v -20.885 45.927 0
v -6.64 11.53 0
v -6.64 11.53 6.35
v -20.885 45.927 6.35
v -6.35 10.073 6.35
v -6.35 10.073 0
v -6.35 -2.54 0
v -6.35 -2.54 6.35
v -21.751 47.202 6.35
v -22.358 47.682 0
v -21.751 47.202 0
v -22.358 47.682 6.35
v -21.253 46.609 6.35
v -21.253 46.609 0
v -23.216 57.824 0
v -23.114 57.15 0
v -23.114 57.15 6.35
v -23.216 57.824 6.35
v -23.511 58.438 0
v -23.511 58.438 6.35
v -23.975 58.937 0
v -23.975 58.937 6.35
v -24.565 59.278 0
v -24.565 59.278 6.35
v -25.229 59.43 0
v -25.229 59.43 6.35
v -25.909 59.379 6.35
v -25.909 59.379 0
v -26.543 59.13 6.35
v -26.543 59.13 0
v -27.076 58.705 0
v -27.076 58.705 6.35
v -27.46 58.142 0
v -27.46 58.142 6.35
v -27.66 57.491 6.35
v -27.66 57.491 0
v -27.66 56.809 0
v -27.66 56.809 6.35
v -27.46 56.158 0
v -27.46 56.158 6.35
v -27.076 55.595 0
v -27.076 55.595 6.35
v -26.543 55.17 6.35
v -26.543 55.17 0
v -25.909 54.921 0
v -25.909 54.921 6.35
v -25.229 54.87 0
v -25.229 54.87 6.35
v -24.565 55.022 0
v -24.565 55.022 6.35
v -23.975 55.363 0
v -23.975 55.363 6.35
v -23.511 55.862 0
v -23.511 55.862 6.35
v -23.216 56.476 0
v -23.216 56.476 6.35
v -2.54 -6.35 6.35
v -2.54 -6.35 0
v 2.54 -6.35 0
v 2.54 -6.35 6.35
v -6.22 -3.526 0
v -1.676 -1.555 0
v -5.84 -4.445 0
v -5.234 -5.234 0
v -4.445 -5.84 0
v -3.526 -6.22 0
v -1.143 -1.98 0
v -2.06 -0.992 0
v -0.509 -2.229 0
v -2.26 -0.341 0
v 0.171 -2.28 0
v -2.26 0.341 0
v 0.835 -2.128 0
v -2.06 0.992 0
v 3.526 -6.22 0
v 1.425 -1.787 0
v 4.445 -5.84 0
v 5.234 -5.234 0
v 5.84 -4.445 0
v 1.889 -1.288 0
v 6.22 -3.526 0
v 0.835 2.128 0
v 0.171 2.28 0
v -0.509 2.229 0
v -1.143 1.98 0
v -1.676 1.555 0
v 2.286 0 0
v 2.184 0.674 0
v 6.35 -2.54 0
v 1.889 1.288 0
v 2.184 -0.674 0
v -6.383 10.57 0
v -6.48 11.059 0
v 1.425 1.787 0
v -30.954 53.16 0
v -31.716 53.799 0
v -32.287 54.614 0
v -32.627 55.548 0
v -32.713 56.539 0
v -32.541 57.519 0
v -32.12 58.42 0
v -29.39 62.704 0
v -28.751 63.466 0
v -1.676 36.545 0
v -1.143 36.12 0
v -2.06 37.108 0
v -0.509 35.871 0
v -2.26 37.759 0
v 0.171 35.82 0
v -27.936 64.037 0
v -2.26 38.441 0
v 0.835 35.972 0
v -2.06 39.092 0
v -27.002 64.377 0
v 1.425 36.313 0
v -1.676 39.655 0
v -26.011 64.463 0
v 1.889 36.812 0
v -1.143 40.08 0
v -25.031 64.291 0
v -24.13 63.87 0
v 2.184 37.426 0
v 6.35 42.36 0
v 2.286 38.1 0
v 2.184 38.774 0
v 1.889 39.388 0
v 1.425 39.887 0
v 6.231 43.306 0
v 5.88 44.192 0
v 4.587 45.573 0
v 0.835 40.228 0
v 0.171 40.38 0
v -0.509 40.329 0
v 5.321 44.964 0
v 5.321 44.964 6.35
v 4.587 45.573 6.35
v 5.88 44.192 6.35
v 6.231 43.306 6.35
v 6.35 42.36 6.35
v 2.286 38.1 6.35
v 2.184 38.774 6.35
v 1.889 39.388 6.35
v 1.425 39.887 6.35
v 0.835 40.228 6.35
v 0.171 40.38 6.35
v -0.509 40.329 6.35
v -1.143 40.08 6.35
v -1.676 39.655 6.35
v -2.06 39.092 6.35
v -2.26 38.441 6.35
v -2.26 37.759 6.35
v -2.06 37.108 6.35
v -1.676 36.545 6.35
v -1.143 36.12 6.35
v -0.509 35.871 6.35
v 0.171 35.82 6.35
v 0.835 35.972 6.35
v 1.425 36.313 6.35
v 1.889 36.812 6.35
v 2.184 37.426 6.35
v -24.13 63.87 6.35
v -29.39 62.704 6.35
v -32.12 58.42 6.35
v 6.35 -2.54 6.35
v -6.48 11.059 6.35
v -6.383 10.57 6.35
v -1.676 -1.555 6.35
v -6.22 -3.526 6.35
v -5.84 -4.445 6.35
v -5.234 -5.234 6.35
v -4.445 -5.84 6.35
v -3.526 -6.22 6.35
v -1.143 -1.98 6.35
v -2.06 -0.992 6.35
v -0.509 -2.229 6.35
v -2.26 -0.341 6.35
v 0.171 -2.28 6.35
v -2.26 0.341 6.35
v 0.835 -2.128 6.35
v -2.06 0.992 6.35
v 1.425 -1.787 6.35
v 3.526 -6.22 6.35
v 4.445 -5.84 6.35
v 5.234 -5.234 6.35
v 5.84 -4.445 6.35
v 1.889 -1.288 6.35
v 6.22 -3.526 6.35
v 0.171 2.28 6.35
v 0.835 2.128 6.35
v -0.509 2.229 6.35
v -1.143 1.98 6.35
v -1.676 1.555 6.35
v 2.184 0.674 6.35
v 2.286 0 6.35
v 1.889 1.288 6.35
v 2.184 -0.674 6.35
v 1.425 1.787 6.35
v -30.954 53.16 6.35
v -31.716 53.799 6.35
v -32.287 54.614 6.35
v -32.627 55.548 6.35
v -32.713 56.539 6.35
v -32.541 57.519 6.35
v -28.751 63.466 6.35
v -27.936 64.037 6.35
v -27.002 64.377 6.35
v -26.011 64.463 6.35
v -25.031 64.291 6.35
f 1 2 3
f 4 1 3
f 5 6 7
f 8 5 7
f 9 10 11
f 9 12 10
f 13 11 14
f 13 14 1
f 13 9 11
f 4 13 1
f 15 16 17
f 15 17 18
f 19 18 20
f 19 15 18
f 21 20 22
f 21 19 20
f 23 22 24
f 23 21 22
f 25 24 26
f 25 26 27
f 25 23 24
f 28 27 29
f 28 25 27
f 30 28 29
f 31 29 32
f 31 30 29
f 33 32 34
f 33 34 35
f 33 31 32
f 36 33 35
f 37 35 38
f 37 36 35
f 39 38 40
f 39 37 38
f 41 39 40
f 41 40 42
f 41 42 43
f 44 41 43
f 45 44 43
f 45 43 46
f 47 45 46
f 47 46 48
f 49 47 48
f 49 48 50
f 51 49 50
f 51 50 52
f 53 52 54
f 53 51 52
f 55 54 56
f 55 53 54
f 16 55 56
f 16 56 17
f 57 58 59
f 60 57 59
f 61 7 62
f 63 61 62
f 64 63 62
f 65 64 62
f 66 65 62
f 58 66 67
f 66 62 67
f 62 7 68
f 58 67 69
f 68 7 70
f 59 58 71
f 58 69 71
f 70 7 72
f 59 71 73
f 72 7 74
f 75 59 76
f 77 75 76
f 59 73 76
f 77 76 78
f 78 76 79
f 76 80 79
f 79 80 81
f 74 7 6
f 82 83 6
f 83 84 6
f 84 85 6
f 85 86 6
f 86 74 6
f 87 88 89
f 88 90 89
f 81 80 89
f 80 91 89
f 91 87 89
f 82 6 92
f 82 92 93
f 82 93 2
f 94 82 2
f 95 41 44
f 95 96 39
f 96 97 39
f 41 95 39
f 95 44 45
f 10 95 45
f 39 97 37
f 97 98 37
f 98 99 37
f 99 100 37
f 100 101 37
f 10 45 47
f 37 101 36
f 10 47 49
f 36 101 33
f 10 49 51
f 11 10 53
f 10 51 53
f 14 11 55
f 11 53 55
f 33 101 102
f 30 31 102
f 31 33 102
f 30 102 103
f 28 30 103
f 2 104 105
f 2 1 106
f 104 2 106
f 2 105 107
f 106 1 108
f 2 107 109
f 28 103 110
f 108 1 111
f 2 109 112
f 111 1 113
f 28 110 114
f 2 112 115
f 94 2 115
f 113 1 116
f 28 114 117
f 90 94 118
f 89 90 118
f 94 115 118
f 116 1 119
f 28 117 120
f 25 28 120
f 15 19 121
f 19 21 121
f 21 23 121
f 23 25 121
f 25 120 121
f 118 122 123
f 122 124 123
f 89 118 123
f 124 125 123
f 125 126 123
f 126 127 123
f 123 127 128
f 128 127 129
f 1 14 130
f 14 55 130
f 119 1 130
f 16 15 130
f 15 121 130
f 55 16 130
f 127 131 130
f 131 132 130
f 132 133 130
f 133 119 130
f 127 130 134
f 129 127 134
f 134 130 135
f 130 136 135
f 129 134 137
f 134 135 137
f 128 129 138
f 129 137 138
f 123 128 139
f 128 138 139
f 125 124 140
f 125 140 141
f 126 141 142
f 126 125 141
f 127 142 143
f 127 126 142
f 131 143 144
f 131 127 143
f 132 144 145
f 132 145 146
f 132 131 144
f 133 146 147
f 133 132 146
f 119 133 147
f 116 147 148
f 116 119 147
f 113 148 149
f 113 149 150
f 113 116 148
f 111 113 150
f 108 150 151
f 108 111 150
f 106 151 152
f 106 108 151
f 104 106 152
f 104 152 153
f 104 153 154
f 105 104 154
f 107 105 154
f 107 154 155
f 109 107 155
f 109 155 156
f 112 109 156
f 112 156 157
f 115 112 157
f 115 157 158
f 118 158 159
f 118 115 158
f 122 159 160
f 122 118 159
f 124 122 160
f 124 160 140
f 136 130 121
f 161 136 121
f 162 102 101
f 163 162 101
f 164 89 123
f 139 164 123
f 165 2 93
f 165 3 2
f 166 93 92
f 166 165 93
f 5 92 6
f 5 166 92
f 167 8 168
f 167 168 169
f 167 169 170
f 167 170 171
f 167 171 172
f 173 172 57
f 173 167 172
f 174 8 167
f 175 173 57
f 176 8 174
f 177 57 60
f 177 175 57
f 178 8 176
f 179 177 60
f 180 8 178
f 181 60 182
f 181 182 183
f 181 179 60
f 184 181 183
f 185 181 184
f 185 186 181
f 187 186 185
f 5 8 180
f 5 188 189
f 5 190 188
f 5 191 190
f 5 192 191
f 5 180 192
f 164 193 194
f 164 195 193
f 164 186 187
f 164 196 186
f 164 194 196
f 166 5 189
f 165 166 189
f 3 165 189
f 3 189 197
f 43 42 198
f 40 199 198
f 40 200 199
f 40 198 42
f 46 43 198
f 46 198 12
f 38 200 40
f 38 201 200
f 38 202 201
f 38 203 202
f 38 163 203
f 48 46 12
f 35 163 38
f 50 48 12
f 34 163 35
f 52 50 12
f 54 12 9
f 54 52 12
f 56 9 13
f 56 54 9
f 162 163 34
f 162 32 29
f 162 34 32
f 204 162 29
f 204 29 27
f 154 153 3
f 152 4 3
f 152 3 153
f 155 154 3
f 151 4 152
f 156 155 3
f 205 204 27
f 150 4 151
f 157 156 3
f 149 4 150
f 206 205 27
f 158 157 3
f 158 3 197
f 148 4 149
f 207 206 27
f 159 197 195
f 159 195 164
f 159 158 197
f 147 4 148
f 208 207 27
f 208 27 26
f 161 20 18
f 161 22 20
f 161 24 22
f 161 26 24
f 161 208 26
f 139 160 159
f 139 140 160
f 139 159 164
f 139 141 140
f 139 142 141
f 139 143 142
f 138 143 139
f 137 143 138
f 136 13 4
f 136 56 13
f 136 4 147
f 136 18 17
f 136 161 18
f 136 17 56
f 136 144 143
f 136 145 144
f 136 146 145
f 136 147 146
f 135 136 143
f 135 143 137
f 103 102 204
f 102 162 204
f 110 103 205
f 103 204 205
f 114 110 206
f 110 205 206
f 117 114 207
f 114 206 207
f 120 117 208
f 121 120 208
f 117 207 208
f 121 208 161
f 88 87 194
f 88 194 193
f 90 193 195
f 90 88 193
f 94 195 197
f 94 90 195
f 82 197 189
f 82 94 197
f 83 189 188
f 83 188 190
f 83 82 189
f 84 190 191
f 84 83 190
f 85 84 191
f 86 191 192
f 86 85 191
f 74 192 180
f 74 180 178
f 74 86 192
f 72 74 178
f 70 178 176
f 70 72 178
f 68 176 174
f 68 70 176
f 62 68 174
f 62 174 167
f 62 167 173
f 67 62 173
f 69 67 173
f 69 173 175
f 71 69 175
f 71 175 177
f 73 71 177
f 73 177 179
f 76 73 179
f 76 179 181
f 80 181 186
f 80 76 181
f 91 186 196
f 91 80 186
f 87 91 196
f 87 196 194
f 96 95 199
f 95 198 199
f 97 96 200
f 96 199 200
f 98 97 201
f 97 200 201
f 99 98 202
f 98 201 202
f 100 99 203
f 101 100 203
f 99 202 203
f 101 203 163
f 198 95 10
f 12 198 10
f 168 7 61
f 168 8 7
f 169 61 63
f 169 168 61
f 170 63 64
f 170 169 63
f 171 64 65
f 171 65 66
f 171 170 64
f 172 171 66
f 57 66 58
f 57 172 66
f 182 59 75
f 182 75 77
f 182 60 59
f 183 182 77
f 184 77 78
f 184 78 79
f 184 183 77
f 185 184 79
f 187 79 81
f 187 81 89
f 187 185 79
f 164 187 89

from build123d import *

# Parameters (mm, degrees)
SKETCH1_R           = 2.286
BOSS_EXTRUDE1_DEPTH = 6.35
CHAMFER1_SIZE       = 17.78
CHAMFER1_SIZE2      = 26.652616032
FILLET1_R           = 3.81


with BuildPart() as part:
    # Sketch1 → Boss-Extrude1 (new body)
    with BuildSketch(Plane.XY):
        Polygon((-34.167492812, 55.206788795), (-6.35, 37.482986116), (-6.35, -6.35), (6.35, -6.35), (6.35, 44.45), (-27.343211205, 65.917492812), align=None)
        Circle(SKETCH1_R, mode=Mode.SUBTRACT)
        with Locations((0, 38.1)):
            Circle(SKETCH1_R, mode=Mode.SUBTRACT)
        with Locations((-25.4, 57.15)):
            Circle(SKETCH1_R, mode=Mode.SUBTRACT)
    extrude(amount=BOSS_EXTRUDE1_DEPTH)

    # Chamfer1
    chamfer1_edges = [part.edges().sort_by_distance(p)[0] for p in [
        (-6.35, 37.482986116, 3.175),
    ]]
    chamfer1_side = [part.faces().sort_by_distance(p)[0] for p in [
        (-20.258746406, 46.344887456, 3.175),
    ]]
    chamfer(chamfer1_edges, length=CHAMFER1_SIZE, length2=CHAMFER1_SIZE2, reference=chamfer1_side[0])

    # Fillet1
    fillet1_edges = [part.edges().sort_by_distance(p)[0] for p in [
        (-27.343211205, 65.917492812, 3.175),
        (6.35, 44.45, 3.175),
        (6.35, -6.35, 3.175),
        (-6.35, -6.35, 3.175),
        (-34.167492812, 55.206788795, 3.175),
        (-6.35, 10.830370085, 3.175),
        (-21.344985624, 47.036980366, 3.175),
    ]]
    fillet(fillet1_edges, radius=FILLET1_R)


solid = part.part
